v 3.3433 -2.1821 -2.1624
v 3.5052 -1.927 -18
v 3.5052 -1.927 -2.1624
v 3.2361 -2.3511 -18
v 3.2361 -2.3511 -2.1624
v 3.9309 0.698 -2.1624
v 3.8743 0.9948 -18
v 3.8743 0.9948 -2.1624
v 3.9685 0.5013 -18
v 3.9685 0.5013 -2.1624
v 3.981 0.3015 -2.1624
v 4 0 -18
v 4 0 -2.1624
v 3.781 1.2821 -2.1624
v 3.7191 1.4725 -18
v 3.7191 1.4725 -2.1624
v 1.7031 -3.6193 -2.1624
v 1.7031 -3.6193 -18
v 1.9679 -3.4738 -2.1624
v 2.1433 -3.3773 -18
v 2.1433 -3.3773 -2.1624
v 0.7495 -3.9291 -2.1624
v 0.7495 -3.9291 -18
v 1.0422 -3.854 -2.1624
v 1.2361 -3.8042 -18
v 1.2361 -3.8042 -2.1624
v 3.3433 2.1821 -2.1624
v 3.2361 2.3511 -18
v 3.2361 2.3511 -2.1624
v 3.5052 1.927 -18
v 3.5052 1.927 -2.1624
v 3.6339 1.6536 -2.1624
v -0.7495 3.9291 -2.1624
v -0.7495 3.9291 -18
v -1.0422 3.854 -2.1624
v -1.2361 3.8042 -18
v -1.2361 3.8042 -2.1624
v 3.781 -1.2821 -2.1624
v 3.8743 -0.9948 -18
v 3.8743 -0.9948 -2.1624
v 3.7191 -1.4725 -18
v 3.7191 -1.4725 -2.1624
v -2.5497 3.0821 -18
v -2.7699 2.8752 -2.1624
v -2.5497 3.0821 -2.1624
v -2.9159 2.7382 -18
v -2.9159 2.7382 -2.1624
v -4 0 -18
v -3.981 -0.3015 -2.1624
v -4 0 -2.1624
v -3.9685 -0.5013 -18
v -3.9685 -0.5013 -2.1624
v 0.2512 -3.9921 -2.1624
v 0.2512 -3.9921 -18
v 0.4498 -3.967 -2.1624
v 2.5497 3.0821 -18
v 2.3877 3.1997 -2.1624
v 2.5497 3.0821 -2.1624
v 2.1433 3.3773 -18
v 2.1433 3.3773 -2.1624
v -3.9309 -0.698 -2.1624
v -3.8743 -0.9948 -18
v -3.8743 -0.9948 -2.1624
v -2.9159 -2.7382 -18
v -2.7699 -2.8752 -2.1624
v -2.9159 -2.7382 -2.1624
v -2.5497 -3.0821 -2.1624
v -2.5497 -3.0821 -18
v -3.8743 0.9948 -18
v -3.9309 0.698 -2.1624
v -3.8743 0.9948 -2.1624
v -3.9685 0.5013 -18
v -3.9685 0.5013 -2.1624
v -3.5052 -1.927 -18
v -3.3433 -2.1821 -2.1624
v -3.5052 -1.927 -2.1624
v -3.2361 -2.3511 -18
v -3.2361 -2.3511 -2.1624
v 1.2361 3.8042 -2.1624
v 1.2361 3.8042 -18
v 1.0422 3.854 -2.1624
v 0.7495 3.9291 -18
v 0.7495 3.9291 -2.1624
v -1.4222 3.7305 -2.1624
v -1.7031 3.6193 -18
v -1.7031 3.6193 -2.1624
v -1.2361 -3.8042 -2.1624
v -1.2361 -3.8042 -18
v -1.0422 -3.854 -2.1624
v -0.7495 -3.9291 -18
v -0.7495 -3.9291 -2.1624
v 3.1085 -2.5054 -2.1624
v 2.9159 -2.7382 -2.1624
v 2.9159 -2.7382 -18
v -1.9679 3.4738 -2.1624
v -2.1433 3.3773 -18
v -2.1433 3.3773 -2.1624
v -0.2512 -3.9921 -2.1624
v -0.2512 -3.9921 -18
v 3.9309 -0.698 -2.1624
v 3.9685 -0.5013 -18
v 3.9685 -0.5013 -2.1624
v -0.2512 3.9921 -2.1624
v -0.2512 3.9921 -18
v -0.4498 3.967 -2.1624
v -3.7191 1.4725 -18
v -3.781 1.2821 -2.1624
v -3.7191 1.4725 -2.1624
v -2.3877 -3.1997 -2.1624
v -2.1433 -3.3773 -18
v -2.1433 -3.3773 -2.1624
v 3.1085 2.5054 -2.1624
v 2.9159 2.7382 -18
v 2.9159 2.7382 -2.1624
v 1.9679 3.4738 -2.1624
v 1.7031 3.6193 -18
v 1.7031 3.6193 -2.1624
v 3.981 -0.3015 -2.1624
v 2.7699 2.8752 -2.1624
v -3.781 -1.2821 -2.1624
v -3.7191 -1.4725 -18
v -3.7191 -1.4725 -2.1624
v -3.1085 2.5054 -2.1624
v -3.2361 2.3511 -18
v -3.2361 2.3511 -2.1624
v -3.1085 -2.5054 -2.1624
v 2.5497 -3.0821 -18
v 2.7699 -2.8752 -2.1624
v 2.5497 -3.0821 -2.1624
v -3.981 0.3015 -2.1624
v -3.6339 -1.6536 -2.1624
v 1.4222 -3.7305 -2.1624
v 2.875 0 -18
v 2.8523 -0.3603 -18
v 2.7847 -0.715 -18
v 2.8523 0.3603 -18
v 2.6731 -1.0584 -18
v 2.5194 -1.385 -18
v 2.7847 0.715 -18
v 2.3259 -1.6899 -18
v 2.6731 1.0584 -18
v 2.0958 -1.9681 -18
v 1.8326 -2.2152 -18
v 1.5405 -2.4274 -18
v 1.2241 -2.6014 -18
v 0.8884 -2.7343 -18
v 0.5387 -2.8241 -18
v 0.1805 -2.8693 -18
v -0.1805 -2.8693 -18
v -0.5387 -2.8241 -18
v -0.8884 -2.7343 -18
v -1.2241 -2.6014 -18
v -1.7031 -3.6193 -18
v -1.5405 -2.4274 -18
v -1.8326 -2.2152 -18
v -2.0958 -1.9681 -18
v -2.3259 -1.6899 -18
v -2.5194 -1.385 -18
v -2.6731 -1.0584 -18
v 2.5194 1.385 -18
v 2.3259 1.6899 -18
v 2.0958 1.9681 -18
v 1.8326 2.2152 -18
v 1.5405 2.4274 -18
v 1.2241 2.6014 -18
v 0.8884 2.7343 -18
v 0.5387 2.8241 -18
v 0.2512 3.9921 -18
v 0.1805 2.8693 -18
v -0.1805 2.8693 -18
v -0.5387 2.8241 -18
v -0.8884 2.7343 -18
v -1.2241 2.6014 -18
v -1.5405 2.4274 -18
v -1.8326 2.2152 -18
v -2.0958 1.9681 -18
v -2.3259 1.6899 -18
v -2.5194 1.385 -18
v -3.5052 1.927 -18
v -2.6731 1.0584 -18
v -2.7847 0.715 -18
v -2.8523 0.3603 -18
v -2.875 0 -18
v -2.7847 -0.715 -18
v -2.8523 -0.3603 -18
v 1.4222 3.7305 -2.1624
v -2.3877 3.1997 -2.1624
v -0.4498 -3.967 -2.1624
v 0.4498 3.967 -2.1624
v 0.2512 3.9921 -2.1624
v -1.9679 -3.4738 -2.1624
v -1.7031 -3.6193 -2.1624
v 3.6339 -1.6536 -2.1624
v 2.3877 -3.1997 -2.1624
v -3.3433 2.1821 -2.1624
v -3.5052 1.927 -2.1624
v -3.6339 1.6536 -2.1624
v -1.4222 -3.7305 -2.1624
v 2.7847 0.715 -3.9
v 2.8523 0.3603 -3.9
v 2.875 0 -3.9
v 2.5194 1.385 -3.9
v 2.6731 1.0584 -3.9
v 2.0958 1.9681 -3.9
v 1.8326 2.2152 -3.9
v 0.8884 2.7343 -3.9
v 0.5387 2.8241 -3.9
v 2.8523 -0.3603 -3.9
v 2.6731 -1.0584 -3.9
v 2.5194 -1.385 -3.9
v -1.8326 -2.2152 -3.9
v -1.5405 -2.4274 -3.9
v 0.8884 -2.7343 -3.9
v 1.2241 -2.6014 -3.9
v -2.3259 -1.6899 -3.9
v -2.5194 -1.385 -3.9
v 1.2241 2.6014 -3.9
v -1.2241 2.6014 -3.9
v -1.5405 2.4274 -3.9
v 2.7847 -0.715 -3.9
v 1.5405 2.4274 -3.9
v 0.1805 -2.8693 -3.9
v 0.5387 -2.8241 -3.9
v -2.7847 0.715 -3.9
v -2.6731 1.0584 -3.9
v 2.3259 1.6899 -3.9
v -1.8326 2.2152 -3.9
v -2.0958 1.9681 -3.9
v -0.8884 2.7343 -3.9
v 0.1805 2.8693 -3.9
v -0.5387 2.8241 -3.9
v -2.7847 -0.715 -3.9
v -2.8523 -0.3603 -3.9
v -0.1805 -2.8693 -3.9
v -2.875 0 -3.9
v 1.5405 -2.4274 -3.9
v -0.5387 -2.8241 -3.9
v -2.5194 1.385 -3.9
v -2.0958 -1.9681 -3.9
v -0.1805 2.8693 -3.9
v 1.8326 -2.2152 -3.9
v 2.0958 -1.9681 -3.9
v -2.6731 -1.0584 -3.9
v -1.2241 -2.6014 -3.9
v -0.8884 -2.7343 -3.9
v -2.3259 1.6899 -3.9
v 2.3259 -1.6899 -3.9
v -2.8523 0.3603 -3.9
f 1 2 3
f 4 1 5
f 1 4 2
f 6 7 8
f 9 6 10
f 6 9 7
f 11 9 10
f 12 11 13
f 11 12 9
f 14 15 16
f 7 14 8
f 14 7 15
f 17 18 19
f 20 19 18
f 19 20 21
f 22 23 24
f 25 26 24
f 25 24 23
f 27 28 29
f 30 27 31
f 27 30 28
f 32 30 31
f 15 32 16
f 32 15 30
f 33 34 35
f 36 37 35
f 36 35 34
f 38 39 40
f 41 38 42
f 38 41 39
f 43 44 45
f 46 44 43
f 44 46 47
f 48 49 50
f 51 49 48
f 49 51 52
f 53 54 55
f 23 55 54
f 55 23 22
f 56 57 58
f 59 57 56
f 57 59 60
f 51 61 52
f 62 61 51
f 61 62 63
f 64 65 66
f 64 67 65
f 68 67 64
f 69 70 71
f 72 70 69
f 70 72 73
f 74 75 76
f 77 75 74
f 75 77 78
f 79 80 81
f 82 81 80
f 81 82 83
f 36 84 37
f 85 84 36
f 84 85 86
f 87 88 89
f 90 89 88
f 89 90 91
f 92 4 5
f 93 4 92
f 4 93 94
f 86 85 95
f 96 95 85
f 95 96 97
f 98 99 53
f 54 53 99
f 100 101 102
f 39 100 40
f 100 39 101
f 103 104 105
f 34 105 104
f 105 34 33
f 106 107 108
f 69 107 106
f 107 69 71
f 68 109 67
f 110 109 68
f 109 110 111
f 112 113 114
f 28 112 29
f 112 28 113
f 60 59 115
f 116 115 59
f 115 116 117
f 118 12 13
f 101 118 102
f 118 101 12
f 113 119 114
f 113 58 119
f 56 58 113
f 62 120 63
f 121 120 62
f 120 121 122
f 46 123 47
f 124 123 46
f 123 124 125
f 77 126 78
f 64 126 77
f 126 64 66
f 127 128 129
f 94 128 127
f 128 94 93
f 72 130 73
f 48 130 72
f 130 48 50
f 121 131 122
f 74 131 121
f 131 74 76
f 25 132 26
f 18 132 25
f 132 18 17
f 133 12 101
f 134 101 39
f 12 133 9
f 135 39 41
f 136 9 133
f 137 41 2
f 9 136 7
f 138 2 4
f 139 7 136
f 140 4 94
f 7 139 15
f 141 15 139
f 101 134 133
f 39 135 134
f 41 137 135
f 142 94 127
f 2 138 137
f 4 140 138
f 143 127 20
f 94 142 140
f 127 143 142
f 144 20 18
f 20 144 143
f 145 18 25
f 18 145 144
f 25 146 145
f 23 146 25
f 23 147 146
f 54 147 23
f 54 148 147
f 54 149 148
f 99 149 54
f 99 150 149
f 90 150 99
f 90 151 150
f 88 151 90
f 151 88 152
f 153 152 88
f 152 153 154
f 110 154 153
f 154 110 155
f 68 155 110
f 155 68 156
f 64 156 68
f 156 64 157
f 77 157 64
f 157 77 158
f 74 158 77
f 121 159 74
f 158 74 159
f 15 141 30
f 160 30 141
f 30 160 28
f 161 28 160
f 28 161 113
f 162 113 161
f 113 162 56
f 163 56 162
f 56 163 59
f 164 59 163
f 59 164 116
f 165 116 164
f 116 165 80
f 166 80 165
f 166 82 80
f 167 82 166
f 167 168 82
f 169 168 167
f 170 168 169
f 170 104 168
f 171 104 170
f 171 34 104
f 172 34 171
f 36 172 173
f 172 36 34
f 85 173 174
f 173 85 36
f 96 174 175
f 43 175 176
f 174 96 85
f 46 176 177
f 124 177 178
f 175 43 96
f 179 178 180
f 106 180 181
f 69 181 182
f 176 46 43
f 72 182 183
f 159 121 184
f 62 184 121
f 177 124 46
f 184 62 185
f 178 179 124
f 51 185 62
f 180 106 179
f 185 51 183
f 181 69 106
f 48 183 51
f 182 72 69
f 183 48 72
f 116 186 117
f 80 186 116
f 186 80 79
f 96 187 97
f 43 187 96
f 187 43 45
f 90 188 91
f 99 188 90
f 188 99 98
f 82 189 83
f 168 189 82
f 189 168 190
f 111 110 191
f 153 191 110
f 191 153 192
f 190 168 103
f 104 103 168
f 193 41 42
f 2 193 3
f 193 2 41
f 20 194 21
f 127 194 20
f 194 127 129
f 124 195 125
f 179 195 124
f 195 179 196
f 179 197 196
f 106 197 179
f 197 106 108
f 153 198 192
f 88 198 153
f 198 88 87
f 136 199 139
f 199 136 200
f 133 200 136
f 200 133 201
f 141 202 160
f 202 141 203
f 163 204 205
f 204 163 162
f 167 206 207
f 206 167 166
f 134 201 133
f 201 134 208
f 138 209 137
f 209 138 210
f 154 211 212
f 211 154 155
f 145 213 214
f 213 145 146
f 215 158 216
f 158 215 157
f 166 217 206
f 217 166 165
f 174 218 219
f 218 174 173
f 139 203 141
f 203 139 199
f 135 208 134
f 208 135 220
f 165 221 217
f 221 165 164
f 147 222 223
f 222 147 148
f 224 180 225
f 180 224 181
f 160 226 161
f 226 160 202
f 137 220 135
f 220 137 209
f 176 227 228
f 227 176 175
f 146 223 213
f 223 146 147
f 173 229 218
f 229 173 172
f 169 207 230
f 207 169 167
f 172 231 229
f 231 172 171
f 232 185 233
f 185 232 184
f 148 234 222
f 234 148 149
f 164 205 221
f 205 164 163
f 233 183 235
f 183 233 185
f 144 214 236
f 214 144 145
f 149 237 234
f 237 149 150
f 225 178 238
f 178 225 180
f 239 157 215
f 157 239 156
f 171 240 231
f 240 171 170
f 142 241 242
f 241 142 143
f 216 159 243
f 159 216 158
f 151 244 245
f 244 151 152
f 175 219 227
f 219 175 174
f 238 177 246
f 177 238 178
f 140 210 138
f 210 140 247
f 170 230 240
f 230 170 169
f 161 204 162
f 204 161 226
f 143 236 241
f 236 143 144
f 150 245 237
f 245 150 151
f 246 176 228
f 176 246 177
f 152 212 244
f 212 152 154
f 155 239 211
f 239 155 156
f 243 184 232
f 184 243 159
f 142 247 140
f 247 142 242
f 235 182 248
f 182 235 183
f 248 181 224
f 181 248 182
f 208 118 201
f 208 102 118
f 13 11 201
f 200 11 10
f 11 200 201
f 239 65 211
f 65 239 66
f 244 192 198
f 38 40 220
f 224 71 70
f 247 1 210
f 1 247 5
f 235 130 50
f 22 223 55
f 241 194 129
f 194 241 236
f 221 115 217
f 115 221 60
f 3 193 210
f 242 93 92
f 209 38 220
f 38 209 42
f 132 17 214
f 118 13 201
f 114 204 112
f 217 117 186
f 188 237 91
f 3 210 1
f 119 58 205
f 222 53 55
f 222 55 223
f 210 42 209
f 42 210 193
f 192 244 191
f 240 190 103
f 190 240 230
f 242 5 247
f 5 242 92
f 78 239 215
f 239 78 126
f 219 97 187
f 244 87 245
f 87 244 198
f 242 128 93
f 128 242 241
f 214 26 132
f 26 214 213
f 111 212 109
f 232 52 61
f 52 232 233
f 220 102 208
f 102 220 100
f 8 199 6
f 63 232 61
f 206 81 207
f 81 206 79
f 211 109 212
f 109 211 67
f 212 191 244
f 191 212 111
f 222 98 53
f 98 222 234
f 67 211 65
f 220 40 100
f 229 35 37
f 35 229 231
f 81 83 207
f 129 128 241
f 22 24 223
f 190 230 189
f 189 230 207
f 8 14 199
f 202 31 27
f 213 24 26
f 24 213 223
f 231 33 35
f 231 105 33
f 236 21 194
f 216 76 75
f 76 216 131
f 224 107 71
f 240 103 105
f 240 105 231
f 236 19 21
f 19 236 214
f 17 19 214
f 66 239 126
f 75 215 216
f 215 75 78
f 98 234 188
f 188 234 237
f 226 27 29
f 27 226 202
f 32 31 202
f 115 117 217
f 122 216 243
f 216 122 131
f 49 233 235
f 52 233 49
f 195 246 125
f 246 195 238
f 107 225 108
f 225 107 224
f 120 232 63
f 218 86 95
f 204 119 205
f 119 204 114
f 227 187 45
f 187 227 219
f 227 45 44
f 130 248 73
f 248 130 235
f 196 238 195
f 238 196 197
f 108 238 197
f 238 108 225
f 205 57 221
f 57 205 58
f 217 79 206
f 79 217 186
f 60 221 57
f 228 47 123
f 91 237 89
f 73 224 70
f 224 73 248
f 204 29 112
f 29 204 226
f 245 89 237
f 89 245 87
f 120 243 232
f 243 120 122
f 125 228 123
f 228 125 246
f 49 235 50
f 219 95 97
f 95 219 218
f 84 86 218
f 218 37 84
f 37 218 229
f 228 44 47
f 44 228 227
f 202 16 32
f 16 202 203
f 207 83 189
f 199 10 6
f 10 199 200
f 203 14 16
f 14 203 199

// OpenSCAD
$fn = 50;

difference() {
	union() {
		translate(v = [0, 0, -18.0]) {
			cylinder(h = 21, r = 4.0);
		}
		#translate(v = [0, 0, -21.0]) {
			cylinder(h = 21, r = 2.875);
		}
	}
	union() {
		translate(v = [0, 0, 0]) {
			rotate(a = [0, 0, 0]) {
				difference() {
					union() {
						translate(v = [0, 0, -21.0]) {
							cylinder(h = 21, r = 2.6);
						}
						translate(v = [0, 0, -3.9]) {
							cylinder(h = 3.9, r1 = 2.875, r2 = 5.4);
						}
						translate(v = [0, 0, -21.0]) {
							cylinder(h = 21, r = 2.875);
						}
						translate(v = [0, 0, -21.0]) {
							cylinder(h = 21, r = 2.6);
						}
					}
					union();
				}
			}
		}
		#cylinder(h = 3, r = 5.0);
	}
}
